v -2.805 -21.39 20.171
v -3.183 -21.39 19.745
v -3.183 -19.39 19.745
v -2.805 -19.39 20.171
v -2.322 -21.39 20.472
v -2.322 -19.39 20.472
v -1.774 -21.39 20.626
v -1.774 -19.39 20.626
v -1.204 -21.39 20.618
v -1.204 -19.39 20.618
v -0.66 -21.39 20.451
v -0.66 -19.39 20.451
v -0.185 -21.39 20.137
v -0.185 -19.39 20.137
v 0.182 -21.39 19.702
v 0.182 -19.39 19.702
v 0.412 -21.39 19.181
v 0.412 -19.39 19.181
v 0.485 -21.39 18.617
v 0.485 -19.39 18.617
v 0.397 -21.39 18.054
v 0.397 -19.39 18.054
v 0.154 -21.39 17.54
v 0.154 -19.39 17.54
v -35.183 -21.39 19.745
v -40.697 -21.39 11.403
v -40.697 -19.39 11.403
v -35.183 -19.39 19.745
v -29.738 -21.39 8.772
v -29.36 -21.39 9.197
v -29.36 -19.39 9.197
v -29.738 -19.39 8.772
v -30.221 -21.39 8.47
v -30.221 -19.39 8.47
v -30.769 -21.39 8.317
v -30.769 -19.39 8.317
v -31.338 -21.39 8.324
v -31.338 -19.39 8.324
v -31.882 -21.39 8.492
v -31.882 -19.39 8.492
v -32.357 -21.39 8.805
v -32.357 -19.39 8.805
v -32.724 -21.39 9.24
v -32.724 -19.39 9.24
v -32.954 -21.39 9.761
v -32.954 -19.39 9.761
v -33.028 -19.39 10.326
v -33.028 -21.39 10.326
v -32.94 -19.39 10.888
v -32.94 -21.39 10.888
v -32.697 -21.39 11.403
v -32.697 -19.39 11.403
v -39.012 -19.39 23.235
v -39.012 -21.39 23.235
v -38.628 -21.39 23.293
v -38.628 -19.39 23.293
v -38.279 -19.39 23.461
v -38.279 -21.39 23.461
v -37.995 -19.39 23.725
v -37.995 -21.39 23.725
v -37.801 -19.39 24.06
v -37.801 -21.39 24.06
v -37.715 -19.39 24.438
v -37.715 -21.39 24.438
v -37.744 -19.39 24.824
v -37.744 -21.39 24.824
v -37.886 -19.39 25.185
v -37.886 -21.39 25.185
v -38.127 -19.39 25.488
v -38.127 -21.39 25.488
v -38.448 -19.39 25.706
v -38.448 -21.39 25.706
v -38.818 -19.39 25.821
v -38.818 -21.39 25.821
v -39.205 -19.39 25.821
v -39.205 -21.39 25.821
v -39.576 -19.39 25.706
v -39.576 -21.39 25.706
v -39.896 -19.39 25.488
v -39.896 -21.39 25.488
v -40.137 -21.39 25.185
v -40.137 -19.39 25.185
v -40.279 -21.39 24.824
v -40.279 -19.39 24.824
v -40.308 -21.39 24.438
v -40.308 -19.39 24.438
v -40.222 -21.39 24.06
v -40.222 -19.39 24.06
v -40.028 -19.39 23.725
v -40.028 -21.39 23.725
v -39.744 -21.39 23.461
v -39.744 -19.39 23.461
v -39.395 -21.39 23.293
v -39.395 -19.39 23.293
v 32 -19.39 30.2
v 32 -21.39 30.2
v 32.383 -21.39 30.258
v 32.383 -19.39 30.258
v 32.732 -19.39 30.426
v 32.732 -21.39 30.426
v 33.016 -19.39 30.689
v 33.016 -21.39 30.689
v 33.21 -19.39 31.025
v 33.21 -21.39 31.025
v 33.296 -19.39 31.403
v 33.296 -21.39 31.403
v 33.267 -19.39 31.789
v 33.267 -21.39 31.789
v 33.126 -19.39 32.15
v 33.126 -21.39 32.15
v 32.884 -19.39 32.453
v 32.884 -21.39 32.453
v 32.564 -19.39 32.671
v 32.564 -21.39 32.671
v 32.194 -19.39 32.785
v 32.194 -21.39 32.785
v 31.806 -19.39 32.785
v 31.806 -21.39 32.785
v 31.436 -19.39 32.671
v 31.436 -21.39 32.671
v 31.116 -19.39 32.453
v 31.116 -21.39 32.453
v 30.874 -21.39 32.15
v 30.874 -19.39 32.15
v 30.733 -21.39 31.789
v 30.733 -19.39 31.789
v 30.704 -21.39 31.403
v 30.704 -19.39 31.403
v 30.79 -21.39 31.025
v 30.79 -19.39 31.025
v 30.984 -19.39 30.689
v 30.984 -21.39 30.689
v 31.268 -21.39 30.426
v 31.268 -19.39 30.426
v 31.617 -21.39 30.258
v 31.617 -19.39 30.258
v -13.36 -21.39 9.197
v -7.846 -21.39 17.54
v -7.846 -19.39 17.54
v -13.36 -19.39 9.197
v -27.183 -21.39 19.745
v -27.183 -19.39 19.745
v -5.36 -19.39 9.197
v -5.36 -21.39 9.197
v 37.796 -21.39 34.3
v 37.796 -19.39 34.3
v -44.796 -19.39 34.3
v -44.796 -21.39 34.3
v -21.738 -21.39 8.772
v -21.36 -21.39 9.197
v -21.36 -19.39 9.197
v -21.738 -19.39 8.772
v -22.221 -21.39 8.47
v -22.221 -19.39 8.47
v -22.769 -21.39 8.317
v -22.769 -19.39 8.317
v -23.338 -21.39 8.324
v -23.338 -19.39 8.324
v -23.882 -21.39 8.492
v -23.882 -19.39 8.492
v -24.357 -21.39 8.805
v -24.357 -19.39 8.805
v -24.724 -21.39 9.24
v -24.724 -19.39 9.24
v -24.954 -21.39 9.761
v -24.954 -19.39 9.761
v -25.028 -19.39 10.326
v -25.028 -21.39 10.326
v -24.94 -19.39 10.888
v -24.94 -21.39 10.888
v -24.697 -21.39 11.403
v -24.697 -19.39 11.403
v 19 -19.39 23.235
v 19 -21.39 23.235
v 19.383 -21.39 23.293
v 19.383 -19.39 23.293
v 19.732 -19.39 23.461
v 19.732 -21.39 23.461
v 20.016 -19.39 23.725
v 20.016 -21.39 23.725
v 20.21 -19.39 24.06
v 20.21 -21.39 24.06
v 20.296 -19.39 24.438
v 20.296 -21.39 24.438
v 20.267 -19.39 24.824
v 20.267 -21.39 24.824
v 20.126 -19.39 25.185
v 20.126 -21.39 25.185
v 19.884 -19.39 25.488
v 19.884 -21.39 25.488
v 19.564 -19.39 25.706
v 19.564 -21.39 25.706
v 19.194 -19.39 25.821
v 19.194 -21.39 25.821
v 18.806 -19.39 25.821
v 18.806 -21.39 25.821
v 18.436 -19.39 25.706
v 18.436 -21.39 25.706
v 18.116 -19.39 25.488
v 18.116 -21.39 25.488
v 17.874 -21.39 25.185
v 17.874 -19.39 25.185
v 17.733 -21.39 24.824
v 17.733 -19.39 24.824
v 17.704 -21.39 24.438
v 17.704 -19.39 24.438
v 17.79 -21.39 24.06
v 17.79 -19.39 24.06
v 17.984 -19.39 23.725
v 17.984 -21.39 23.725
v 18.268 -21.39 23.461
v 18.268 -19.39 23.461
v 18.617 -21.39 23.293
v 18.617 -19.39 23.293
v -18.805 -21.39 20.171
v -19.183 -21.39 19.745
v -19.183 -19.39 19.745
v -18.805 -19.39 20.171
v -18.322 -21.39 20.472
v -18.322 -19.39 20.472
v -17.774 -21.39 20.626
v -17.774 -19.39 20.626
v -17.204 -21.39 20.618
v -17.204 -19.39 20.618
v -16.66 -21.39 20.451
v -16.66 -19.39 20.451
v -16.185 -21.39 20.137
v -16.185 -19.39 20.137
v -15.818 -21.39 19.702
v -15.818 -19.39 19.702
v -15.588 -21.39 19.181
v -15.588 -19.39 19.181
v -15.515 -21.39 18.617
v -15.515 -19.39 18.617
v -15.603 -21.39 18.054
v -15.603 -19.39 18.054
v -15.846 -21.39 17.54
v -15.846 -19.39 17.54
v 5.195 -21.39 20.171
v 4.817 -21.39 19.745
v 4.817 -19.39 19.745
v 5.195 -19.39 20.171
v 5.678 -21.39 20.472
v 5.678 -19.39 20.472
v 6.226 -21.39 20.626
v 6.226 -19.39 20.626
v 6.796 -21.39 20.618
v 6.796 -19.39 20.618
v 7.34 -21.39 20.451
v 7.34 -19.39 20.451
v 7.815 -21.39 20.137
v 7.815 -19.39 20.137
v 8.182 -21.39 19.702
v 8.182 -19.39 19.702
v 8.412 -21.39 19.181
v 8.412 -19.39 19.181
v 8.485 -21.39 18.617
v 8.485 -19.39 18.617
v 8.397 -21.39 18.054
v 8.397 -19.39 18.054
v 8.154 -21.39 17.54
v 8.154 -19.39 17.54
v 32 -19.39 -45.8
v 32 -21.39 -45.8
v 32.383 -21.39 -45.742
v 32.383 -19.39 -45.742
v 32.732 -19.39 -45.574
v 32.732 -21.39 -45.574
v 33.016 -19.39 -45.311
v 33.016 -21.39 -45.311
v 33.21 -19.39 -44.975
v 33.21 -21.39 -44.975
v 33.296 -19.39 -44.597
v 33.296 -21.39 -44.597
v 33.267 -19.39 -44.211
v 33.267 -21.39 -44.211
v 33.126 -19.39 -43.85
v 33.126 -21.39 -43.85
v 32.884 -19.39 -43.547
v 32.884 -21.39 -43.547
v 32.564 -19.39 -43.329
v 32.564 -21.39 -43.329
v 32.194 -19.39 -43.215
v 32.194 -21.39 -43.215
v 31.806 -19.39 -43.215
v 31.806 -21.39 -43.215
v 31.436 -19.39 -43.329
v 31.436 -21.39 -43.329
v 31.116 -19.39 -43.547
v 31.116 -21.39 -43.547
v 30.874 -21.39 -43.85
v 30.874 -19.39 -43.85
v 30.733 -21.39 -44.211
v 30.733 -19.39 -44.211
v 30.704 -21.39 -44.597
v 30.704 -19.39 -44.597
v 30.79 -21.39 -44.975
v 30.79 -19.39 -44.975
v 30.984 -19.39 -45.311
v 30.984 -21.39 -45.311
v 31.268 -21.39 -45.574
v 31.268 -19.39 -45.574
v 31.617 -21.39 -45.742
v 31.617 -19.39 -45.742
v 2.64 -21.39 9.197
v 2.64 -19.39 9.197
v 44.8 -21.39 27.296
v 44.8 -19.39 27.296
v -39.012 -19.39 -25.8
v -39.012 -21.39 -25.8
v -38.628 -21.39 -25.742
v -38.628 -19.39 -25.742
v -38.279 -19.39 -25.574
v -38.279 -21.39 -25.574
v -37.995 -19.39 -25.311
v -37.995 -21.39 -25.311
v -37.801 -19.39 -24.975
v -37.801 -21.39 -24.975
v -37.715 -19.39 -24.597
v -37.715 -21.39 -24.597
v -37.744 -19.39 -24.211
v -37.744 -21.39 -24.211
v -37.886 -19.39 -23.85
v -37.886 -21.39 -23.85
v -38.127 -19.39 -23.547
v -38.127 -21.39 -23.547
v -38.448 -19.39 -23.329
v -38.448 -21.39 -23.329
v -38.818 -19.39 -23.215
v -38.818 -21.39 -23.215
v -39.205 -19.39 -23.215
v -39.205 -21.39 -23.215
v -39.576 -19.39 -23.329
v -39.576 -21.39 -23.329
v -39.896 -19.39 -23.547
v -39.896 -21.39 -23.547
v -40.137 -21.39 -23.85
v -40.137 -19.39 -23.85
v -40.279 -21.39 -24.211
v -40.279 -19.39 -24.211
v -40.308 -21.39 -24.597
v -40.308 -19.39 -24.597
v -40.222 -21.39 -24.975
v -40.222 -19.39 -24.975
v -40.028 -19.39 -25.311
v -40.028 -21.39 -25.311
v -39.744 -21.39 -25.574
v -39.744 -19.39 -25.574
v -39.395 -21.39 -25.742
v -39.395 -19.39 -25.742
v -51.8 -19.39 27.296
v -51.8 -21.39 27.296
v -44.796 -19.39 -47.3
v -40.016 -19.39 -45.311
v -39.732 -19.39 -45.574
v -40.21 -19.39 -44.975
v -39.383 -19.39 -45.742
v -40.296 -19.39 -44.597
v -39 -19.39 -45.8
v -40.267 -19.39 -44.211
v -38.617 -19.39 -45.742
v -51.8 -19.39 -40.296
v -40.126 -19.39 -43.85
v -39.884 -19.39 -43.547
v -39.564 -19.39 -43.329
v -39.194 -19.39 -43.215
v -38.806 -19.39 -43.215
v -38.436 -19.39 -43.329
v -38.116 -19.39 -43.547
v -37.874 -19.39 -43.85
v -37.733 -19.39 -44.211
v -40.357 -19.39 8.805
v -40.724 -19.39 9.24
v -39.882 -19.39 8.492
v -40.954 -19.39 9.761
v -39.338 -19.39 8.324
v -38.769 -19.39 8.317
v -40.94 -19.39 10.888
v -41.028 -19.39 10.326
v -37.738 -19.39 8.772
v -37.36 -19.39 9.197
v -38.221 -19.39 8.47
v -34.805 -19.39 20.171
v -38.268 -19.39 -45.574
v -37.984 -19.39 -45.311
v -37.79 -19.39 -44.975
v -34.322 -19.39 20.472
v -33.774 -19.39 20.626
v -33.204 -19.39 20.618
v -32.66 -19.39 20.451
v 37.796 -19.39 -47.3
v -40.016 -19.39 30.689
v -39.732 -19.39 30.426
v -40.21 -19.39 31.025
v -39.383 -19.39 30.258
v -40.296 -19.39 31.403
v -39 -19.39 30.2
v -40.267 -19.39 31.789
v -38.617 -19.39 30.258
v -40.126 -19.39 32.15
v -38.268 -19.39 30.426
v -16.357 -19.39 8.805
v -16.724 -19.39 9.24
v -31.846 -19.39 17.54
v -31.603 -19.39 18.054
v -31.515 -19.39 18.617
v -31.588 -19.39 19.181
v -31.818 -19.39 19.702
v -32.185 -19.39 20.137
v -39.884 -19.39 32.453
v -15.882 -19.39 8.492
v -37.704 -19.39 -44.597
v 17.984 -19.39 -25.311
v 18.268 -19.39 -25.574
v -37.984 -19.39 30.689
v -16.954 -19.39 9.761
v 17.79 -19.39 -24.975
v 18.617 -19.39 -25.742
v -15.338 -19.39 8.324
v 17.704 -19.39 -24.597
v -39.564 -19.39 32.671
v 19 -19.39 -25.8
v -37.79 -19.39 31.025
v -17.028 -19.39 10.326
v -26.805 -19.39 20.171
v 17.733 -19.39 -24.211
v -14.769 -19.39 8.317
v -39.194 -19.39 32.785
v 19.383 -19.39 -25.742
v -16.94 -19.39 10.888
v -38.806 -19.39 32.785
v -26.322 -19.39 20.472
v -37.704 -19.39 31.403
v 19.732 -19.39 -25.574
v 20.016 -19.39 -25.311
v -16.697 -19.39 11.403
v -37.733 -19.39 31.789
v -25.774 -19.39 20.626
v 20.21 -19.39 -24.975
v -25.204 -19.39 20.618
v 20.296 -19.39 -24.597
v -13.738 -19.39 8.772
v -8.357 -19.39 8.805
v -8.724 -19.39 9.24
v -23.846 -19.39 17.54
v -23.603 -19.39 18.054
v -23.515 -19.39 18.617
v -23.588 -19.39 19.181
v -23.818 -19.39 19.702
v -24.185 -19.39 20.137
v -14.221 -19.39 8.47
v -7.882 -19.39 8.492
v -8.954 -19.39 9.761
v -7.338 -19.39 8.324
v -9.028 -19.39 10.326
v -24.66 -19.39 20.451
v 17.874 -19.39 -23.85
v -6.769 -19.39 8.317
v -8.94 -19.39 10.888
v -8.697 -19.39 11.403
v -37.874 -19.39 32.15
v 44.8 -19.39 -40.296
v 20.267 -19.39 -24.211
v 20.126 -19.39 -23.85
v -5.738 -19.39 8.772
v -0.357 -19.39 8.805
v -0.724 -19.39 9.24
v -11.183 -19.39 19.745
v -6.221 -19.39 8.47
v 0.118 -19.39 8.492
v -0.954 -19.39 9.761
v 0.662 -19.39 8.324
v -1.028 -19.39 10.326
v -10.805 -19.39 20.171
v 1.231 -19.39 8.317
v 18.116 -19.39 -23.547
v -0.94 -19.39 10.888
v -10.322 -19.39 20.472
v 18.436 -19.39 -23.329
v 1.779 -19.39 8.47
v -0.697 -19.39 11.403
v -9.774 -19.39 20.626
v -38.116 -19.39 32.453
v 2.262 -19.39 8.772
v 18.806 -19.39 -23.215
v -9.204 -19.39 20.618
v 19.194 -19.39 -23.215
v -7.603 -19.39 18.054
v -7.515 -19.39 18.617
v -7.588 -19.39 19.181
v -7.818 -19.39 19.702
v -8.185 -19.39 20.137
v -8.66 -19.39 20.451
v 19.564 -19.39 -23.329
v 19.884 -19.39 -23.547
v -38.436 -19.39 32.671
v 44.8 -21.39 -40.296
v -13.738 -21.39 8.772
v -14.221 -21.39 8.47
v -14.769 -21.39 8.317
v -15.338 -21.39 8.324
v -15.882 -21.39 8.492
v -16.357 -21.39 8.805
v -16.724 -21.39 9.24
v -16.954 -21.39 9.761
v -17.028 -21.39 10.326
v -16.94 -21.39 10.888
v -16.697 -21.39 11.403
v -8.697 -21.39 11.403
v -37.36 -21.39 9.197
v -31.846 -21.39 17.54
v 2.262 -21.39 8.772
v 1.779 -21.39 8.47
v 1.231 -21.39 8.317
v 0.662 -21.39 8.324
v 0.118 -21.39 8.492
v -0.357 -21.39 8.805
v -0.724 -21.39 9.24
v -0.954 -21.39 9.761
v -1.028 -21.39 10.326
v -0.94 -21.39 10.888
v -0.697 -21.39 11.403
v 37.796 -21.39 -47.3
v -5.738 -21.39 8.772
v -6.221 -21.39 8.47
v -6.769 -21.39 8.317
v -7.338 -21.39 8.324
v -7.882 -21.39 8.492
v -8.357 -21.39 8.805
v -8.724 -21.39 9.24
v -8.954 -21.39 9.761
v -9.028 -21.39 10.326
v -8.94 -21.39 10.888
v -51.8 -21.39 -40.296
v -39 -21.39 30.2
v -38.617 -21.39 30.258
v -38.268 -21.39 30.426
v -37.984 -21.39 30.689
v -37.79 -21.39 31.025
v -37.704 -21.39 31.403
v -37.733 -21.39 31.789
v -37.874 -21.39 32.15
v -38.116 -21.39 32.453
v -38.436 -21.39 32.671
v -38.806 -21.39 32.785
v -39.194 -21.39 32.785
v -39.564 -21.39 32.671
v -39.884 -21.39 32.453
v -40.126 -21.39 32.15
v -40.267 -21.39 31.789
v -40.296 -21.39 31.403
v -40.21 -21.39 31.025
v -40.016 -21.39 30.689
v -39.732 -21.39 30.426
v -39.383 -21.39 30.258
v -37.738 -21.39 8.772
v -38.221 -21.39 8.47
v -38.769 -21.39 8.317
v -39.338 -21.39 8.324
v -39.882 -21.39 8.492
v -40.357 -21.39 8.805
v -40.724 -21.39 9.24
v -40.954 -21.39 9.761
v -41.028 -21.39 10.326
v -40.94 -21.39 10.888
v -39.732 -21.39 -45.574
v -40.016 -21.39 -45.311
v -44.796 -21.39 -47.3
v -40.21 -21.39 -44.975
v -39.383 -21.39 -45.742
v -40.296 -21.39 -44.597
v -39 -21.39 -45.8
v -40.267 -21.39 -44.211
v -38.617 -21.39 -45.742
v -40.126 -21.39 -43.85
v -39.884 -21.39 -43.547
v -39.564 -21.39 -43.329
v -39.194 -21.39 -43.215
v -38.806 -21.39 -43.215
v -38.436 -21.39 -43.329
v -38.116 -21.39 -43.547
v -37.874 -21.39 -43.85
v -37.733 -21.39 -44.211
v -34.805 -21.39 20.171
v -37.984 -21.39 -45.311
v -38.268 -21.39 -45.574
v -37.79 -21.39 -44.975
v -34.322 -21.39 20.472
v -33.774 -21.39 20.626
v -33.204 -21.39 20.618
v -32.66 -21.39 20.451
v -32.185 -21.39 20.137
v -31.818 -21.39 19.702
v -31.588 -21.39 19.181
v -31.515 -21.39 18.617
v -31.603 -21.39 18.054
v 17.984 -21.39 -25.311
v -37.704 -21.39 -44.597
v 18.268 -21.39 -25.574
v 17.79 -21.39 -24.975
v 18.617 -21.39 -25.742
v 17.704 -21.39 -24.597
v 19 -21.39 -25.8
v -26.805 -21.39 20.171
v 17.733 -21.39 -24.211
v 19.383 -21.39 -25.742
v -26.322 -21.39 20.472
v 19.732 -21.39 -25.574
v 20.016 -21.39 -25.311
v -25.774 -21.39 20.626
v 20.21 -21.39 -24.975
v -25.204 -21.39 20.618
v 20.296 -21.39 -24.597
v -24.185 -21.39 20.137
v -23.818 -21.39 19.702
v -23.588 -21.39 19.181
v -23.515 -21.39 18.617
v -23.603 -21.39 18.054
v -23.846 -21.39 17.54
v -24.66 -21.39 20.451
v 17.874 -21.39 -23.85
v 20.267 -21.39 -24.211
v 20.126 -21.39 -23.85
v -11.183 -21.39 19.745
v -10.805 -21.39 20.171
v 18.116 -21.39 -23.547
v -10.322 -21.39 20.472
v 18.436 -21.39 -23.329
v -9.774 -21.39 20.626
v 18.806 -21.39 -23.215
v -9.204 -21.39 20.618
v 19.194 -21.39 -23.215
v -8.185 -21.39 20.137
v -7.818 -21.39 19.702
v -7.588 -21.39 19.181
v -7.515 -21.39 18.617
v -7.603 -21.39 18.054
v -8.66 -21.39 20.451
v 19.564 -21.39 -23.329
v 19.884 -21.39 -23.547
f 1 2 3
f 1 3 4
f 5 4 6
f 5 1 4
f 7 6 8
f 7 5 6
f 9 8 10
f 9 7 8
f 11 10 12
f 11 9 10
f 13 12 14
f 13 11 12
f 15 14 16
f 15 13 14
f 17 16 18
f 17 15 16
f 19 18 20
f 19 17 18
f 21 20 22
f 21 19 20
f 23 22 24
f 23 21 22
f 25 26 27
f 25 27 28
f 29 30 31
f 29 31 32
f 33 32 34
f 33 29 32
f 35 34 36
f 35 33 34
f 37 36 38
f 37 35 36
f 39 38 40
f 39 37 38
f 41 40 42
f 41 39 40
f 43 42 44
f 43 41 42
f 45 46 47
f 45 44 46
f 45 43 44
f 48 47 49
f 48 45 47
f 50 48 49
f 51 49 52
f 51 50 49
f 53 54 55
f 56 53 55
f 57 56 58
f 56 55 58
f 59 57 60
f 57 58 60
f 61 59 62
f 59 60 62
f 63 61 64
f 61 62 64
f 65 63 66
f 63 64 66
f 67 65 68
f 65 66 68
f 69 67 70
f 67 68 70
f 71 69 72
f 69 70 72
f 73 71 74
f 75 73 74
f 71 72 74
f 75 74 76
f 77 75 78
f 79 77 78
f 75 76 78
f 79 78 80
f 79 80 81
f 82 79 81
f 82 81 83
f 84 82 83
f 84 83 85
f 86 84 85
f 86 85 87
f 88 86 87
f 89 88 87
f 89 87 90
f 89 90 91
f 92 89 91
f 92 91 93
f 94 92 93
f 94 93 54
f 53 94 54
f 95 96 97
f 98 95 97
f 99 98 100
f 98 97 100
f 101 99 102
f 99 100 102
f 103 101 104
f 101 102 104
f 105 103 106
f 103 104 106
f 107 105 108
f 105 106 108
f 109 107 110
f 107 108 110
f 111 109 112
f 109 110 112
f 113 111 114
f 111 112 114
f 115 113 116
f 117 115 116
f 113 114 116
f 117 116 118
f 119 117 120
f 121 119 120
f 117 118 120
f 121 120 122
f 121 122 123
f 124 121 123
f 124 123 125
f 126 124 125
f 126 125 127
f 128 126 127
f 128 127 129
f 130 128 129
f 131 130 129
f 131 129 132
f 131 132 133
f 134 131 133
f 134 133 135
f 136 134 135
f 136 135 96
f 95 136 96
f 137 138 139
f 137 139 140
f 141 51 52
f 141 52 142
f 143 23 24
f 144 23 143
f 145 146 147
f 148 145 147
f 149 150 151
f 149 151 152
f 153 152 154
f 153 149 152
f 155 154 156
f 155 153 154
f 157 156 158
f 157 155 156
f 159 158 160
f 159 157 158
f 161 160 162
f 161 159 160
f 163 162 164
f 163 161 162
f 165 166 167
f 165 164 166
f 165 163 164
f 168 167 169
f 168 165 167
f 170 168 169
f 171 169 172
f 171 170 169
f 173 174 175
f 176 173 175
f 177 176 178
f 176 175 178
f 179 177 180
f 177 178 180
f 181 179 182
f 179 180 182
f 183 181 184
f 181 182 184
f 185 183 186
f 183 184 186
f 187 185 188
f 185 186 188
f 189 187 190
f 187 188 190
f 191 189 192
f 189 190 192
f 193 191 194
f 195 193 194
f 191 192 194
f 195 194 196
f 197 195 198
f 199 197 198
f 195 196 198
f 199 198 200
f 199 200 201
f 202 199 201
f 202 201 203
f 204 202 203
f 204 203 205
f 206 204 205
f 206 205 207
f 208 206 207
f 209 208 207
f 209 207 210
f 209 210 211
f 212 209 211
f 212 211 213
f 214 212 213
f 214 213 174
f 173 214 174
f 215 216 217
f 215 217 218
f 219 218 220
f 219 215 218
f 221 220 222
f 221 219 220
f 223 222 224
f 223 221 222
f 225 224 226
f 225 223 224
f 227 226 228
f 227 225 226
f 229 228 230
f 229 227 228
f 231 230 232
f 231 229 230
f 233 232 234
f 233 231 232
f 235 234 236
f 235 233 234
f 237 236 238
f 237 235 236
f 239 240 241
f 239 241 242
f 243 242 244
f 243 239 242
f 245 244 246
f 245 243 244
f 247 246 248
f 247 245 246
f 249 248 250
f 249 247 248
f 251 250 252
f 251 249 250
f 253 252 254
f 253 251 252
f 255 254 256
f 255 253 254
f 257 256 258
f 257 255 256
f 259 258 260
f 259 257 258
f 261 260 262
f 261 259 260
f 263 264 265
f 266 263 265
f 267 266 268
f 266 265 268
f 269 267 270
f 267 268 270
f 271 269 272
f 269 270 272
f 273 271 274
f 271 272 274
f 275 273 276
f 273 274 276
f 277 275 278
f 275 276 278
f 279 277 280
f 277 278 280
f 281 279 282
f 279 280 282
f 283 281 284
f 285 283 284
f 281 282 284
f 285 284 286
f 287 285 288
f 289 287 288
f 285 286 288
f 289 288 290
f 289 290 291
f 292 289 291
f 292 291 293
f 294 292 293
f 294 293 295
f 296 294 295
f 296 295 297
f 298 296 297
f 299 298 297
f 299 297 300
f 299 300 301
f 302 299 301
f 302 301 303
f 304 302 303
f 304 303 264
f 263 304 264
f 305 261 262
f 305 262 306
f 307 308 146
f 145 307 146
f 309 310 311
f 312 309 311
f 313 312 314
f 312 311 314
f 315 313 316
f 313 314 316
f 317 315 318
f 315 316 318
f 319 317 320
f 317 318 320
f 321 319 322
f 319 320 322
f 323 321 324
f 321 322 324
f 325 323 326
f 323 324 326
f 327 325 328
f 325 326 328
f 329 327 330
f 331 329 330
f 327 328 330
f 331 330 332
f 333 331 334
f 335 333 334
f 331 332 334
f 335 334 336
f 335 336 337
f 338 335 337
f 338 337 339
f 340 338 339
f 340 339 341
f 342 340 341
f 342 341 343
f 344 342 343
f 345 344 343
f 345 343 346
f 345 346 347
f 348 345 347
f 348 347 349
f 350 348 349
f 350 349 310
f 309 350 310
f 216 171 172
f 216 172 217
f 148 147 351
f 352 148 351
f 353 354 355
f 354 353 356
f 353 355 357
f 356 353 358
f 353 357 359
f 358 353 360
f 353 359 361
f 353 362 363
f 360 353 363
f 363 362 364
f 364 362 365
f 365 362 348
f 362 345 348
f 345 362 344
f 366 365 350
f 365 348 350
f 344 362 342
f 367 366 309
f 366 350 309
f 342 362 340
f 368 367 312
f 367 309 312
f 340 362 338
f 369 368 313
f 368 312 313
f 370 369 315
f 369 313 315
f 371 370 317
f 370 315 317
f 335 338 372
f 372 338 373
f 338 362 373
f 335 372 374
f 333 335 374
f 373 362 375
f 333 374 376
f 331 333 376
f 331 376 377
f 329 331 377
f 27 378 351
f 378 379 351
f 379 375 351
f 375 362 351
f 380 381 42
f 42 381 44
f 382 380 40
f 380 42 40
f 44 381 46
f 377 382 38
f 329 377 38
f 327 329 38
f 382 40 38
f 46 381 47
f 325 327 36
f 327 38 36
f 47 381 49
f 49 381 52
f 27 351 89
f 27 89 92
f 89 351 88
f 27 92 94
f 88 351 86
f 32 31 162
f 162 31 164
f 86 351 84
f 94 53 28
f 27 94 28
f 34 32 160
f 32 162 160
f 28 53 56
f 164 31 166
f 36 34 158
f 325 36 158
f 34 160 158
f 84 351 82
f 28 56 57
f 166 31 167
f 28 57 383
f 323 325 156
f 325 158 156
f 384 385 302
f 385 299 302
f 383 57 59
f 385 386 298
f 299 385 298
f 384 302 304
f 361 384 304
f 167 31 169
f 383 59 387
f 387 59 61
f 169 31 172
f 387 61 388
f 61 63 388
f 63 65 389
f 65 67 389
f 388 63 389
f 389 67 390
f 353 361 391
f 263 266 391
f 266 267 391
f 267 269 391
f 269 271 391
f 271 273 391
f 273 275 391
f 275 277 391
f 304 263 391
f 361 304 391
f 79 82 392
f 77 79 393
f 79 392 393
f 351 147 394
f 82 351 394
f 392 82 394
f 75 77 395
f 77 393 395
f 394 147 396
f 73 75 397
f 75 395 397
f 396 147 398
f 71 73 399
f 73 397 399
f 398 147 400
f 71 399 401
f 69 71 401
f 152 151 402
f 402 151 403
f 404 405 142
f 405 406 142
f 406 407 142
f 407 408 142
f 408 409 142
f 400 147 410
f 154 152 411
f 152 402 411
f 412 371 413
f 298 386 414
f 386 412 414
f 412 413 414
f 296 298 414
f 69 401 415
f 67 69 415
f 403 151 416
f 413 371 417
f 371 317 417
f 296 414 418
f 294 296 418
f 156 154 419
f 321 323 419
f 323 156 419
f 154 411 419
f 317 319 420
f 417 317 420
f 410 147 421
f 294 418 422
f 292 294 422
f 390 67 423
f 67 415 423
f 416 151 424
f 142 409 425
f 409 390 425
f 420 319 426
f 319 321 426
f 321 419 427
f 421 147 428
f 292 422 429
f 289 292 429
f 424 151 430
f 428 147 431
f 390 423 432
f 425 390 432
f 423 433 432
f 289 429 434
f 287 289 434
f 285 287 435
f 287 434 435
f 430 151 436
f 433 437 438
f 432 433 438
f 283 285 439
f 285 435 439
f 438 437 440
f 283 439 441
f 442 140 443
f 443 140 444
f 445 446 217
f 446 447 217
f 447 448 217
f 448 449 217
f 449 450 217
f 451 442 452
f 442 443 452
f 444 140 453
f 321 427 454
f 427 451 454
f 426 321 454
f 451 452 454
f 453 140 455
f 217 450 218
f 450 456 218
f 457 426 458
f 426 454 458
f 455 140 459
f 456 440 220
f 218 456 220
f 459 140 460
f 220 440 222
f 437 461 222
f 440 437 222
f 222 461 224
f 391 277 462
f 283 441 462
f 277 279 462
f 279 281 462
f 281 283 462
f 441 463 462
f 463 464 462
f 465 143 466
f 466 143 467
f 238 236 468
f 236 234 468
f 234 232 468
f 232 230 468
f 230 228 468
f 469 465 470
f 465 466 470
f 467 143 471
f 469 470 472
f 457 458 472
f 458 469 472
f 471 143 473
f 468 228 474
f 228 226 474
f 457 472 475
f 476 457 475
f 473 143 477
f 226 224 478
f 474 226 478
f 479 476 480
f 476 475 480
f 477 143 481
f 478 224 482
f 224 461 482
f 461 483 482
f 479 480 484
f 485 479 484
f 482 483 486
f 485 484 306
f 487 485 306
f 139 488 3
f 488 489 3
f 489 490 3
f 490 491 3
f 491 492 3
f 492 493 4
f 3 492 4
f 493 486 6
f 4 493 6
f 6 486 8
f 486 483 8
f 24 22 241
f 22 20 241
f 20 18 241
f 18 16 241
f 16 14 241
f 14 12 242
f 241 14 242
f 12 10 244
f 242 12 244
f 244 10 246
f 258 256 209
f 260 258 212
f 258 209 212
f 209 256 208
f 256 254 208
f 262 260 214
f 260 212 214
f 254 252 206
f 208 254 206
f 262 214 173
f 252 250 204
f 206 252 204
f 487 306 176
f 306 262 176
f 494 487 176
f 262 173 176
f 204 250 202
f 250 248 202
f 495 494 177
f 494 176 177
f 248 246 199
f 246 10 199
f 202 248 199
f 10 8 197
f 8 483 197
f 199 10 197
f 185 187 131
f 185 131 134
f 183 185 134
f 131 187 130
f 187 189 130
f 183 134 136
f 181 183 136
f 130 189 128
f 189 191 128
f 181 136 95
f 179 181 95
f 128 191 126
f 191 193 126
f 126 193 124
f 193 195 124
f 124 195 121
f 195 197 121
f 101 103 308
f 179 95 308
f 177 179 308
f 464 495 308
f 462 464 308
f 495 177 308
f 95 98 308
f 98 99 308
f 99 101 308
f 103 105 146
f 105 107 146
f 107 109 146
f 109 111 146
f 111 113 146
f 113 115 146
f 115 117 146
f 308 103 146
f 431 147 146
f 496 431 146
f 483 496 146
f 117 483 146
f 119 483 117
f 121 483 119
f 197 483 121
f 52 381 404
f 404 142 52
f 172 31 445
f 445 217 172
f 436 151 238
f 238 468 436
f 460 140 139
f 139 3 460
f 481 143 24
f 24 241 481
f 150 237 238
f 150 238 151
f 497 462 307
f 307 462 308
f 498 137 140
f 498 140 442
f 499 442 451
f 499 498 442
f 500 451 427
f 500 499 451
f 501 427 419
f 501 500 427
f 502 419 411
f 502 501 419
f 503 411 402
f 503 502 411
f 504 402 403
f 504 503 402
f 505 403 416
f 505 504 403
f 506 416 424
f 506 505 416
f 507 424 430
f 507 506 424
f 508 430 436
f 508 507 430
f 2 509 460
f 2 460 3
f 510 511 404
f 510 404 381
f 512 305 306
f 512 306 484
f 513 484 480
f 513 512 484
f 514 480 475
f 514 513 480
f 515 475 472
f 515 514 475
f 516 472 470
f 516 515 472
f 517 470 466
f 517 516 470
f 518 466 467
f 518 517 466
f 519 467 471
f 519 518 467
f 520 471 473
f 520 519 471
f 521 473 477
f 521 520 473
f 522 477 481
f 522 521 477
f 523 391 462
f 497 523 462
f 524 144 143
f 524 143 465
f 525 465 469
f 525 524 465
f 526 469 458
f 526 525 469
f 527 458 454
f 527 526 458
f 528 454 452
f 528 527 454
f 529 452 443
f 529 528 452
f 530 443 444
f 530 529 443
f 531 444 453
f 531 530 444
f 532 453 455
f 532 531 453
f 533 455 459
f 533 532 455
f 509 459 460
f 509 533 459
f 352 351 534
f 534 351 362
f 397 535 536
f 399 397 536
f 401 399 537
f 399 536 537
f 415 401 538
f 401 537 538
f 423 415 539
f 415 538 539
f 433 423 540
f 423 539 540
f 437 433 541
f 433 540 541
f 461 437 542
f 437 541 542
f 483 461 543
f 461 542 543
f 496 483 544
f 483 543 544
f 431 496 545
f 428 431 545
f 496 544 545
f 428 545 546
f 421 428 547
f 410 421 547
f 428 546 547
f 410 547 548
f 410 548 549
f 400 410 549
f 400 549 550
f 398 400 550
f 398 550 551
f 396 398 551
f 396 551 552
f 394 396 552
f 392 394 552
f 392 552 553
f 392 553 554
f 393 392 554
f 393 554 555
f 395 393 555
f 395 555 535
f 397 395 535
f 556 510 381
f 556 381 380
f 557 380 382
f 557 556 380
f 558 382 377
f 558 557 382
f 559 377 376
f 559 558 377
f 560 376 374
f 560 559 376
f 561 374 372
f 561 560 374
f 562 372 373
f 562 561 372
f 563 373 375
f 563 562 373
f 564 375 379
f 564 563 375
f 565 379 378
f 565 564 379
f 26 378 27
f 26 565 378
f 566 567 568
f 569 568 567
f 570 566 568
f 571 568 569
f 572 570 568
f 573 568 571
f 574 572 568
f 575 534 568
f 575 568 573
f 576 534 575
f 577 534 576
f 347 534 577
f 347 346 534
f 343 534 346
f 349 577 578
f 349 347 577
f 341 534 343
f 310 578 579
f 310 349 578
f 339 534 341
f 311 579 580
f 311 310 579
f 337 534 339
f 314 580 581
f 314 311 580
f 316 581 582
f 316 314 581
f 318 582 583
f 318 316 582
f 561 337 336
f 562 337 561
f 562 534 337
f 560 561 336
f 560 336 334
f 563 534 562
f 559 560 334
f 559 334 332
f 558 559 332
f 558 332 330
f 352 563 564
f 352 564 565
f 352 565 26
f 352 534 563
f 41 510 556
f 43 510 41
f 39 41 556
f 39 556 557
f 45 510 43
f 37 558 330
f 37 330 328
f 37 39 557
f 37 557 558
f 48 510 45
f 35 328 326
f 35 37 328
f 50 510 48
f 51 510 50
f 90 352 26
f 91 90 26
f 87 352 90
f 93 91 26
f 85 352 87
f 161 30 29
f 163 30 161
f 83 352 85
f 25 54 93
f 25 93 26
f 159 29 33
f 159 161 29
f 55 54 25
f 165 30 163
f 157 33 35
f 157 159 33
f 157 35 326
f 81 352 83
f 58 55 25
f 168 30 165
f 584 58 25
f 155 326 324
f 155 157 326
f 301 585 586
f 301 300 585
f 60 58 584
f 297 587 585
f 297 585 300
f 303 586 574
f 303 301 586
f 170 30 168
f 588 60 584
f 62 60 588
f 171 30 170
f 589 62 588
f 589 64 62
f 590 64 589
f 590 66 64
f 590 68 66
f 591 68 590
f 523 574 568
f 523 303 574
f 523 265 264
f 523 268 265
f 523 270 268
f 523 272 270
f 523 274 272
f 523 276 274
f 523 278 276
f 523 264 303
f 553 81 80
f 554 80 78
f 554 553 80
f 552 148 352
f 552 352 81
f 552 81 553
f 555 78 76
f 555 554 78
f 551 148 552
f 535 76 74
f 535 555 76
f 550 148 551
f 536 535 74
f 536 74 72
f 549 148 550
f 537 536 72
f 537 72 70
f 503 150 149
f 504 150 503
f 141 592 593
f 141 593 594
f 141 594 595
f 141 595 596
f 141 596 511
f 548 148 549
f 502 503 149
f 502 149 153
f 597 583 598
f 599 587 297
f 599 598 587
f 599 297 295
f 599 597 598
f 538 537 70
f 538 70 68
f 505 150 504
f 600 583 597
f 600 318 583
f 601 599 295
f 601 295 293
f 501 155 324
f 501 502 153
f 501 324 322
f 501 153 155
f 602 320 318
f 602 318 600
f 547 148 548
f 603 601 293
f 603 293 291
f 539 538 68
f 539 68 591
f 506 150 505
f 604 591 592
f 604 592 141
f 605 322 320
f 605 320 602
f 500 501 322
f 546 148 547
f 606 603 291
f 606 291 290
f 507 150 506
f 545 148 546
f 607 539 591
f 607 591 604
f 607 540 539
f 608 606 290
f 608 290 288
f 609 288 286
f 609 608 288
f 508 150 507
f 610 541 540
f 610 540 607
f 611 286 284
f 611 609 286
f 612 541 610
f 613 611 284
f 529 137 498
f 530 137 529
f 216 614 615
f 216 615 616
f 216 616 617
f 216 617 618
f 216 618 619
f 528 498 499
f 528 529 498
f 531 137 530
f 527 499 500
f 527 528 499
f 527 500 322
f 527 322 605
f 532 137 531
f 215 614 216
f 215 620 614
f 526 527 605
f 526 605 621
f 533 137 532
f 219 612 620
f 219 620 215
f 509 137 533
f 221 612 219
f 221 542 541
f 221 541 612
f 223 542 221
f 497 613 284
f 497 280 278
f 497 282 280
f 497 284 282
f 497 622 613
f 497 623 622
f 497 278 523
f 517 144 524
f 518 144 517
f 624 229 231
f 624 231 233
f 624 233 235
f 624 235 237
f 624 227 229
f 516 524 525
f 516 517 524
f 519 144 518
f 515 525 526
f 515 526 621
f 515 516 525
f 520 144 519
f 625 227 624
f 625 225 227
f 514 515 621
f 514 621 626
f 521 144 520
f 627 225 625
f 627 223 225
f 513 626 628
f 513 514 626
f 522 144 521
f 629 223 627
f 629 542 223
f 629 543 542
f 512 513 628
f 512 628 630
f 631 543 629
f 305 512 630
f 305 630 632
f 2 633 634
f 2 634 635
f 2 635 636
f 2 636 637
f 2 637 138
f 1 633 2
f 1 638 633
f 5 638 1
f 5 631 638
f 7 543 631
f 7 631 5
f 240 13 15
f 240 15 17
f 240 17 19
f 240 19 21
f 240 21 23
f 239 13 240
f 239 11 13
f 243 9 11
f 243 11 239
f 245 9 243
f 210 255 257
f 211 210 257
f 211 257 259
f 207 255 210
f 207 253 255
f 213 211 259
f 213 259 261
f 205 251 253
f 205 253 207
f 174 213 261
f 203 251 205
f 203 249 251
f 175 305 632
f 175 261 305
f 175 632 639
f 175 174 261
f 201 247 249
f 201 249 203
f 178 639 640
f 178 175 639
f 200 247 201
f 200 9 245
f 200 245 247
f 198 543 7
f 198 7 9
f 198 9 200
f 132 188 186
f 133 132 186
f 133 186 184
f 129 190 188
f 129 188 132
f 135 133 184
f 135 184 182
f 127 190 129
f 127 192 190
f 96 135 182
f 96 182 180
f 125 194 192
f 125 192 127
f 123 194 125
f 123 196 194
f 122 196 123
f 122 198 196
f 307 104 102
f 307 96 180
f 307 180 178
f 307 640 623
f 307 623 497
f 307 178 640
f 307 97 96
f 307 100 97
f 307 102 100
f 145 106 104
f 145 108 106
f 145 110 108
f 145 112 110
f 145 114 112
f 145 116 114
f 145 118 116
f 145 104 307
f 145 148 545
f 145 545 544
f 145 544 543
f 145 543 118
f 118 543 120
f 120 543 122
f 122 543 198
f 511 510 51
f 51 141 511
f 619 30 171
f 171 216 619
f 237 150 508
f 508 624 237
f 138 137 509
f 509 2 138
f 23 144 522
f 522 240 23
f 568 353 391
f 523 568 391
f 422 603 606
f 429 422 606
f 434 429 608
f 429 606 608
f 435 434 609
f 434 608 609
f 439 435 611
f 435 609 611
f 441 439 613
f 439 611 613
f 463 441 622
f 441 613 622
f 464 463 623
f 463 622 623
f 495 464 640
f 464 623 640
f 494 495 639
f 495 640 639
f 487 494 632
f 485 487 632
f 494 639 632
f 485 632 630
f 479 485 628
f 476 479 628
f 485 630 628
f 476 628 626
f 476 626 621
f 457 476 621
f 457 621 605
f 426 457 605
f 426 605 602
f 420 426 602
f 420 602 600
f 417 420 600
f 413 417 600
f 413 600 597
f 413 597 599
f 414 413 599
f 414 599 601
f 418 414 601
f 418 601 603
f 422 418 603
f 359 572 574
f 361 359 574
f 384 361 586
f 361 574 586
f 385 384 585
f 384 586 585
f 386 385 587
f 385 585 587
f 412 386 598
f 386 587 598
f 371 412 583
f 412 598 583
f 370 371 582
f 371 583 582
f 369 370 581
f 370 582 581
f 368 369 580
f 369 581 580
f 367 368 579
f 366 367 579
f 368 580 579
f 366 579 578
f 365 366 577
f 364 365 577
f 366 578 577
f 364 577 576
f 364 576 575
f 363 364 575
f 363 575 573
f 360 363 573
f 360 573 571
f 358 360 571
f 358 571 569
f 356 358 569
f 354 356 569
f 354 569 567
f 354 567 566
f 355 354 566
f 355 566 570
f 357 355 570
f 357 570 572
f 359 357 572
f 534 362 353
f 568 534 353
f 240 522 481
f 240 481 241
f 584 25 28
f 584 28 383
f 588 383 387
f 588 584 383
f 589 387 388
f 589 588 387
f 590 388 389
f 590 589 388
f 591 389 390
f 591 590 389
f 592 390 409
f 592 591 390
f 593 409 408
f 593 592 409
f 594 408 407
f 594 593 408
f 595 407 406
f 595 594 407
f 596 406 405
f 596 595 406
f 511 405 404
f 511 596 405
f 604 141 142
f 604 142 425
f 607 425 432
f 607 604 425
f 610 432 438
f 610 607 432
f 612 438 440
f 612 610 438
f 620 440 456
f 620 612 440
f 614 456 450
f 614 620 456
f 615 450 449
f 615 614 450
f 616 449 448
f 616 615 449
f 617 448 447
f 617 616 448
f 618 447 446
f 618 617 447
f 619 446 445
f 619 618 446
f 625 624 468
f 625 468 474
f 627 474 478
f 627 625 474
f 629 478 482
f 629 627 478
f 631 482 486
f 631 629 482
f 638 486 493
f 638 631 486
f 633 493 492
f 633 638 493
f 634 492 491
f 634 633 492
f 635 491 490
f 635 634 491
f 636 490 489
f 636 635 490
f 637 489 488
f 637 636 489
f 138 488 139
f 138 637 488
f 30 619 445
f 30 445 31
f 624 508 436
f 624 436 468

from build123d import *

# Parameters (mm, degrees)
EXTRUDE_1_DEPTH     = 2
CUT_EXTRUDE_1_REACH = 72.175
SKETCH_2_R          = 1.3
CUT_EXTRUDE_2_REACH = 72.175
SKETCH_3_R          = 1.3
CUT_EXTRUDE_3_REACH = 72.175


with BuildPart() as part:
    # 草图1 → 凸台-拉伸1 (new body)
    with BuildSketch(Plane.XZ.offset(19.39)):
        Polygon((-51.8, -40.295836944), (-44.795836944, -47.3), (37.795836944, -47.3), (44.8, -40.295836944), (44.8, 27.295836944), (37.795836944, 34.3), (-44.795836944, 34.3), (-51.8, 27.295836944), align=None)
    extrude(amount=EXTRUDE_1_DEPTH)

    # 草图2 → 切除-拉伸1 (cut, up to next)
    with BuildSketch(Plane.XZ.offset(21.39), mode=Mode.PRIVATE) as cut_extrude_1_sk1:
        with Locations(Location((-39.011567772, -24.5, 0), (0, 0, 270))):
            Circle(SKETCH_2_R)
    cut_extrude_1_tool1 = extrude(cut_extrude_1_sk1.sketch, amount=-CUT_EXTRUDE_1_REACH, mode=Mode.PRIVATE) & part.part
    # 草图2 → 切除-拉伸1 (cut, up to next)
    with BuildSketch(Plane.XZ.offset(21.39), mode=Mode.PRIVATE) as cut_extrude_1_sk2:
        with Locations(Location((19, -24.5, 0), (0, 0, 270))):
            Circle(SKETCH_2_R)
    cut_extrude_1_tool2 = extrude(cut_extrude_1_sk2.sketch, amount=-CUT_EXTRUDE_1_REACH, mode=Mode.PRIVATE) & part.part
    # 草图2 → 切除-拉伸1 (cut, up to next)
    with BuildSketch(Plane.XZ.offset(21.39), mode=Mode.PRIVATE) as cut_extrude_1_sk3:
        with Locations(Location((-39.011567772, 24.535212594, 0), (0, 0, 270))):
            Circle(SKETCH_2_R)
    cut_extrude_1_tool3 = extrude(cut_extrude_1_sk3.sketch, amount=-CUT_EXTRUDE_1_REACH, mode=Mode.PRIVATE) & part.part
    # 草图2 → 切除-拉伸1 (cut, up to next)
    with BuildSketch(Plane.XZ.offset(21.39), mode=Mode.PRIVATE) as cut_extrude_1_sk4:
        with Locations(Location((19, 24.535212594, 0), (0, 0, 270))):
            Circle(SKETCH_2_R)
    cut_extrude_1_tool4 = extrude(cut_extrude_1_sk4.sketch, amount=-CUT_EXTRUDE_1_REACH, mode=Mode.PRIVATE) & part.part
    add(cut_extrude_1_tool1.solids().sort_by_distance((-39.011568, -21.39, -24.5))[0], mode=Mode.SUBTRACT)
    add(cut_extrude_1_tool2.solids().sort_by_distance((19, -21.39, -24.5))[0], mode=Mode.SUBTRACT)
    add(cut_extrude_1_tool3.solids().sort_by_distance((-39.011568, -21.39, 24.535213))[0], mode=Mode.SUBTRACT)
    add(cut_extrude_1_tool4.solids().sort_by_distance((19, -21.39, 24.535213))[0], mode=Mode.SUBTRACT)

    # 草图3 → 切除-拉伸2 (cut, up to next)
    with BuildSketch(Plane.XZ.offset(21.39), mode=Mode.PRIVATE) as cut_extrude_2_sk1:
        with Locations(Location((32, -44.5, 0), (0, 0, 270))):
            Circle(SKETCH_3_R)
    cut_extrude_2_tool1 = extrude(cut_extrude_2_sk1.sketch, amount=-CUT_EXTRUDE_2_REACH, mode=Mode.PRIVATE) & part.part
    # 草图3 → 切除-拉伸2 (cut, up to next)
    with BuildSketch(Plane.XZ.offset(21.39), mode=Mode.PRIVATE) as cut_extrude_2_sk2:
        with Locations(Location((-39, -44.5, 0), (0, 0, 270))):
            Circle(SKETCH_3_R)
    cut_extrude_2_tool2 = extrude(cut_extrude_2_sk2.sketch, amount=-CUT_EXTRUDE_2_REACH, mode=Mode.PRIVATE) & part.part
    # 草图3 → 切除-拉伸2 (cut, up to next)
    with BuildSketch(Plane.XZ.offset(21.39), mode=Mode.PRIVATE) as cut_extrude_2_sk3:
        with Locations(Location((32, 31.5, 0), (0, 0, 270))):
            Circle(SKETCH_3_R)
    cut_extrude_2_tool3 = extrude(cut_extrude_2_sk3.sketch, amount=-CUT_EXTRUDE_2_REACH, mode=Mode.PRIVATE) & part.part
    # 草图3 → 切除-拉伸2 (cut, up to next)
    with BuildSketch(Plane.XZ.offset(21.39), mode=Mode.PRIVATE) as cut_extrude_2_sk4:
        with Locations(Location((-39, 31.5, 0), (0, 0, 270))):
            Circle(SKETCH_3_R)
    cut_extrude_2_tool4 = extrude(cut_extrude_2_sk4.sketch, amount=-CUT_EXTRUDE_2_REACH, mode=Mode.PRIVATE) & part.part
    add(cut_extrude_2_tool1.solids().sort_by_distance((32, -21.39, -44.5))[0], mode=Mode.SUBTRACT)
    add(cut_extrude_2_tool2.solids().sort_by_distance((-39, -21.39, -44.5))[0], mode=Mode.SUBTRACT)
    add(cut_extrude_2_tool3.solids().sort_by_distance((32, -21.39, 31.5))[0], mode=Mode.SUBTRACT)
    add(cut_extrude_2_tool4.solids().sort_by_distance((-39, -21.39, 31.5))[0], mode=Mode.SUBTRACT)

    # 草图4 → 切除-拉伸3 (cut, up to next)
    with BuildSketch(Plane.XZ.offset(21.39), mode=Mode.PRIVATE) as cut_extrude_3_sk1:
        with BuildLine():
            Line((-40.69671065, 11.402772719), (-35.182847057, 19.74527284))
            ThreePointArc((-35.182847057, 19.74527284), (-32.411574314, 20.311000146), (-31.845847008, 17.539727403))
            Line((-31.845847008, 17.539727403), (-37.359710601, 9.197227281))
            ThreePointArc((-37.359710601, 9.197227281), (-40.130983344, 8.631499976), (-40.69671065, 11.402772719))
        make_face()
    cut_extrude_3_tool1 = extrude(cut_extrude_3_sk1.sketch, amount=-CUT_EXTRUDE_3_REACH, mode=Mode.PRIVATE) & part.part
    # 草图4 → 切除-拉伸3 (cut, up to next)
    with BuildSketch(Plane.XZ.offset(21.39), mode=Mode.PRIVATE) as cut_extrude_3_sk2:
        with BuildLine():
            Line((-32.69671065, 11.402772719), (-27.182847057, 19.74527284))
            ThreePointArc((-27.182847057, 19.74527284), (-24.411574314, 20.311000146), (-23.845847008, 17.539727403))
            Line((-23.845847008, 17.539727403), (-29.359710601, 9.197227281))
            ThreePointArc((-29.359710601, 9.197227281), (-32.130983344, 8.631499976), (-32.69671065, 11.402772719))
        make_face()
    cut_extrude_3_tool2 = extrude(cut_extrude_3_sk2.sketch, amount=-CUT_EXTRUDE_3_REACH, mode=Mode.PRIVATE) & part.part
    # 草图4 → 切除-拉伸3 (cut, up to next)
    with BuildSketch(Plane.XZ.offset(21.39), mode=Mode.PRIVATE) as cut_extrude_3_sk3:
        with BuildLine():
            Line((-24.69671065, 11.402772719), (-19.182847057, 19.74527284))
            ThreePointArc((-19.182847057, 19.74527284), (-16.411574314, 20.311000146), (-15.845847008, 17.539727403))
            Line((-15.845847008, 17.539727403), (-21.359710601, 9.197227281))
            ThreePointArc((-21.359710601, 9.197227281), (-24.130983344, 8.631499976), (-24.69671065, 11.402772719))
        make_face()
    cut_extrude_3_tool3 = extrude(cut_extrude_3_sk3.sketch, amount=-CUT_EXTRUDE_3_REACH, mode=Mode.PRIVATE) & part.part
    # 草图4 → 切除-拉伸3 (cut, up to next)
    with BuildSketch(Plane.XZ.offset(21.39), mode=Mode.PRIVATE) as cut_extrude_3_sk4:
        with BuildLine():
            Line((-16.69671065, 11.402772719), (-11.182847057, 19.74527284))
            ThreePointArc((-11.182847057, 19.74527284), (-8.411574314, 20.311000146), (-7.845847008, 17.539727403))
            Line((-7.845847008, 17.539727403), (-13.359710601, 9.197227281))
            ThreePointArc((-13.359710601, 9.197227281), (-16.130983344, 8.631499976), (-16.69671065, 11.402772719))
        make_face()
    cut_extrude_3_tool4 = extrude(cut_extrude_3_sk4.sketch, amount=-CUT_EXTRUDE_3_REACH, mode=Mode.PRIVATE) & part.part
    # 草图4 → 切除-拉伸3 (cut, up to next)
    with BuildSketch(Plane.XZ.offset(21.39), mode=Mode.PRIVATE) as cut_extrude_3_sk5:
        with BuildLine():
            Line((-8.69671065, 11.402772719), (-3.182847057, 19.74527284))
            ThreePointArc((-3.182847057, 19.74527284), (-0.411574314, 20.311000146), (0.154152992, 17.539727403))
            Line((0.154152992, 17.539727403), (-5.359710601, 9.197227281))
            ThreePointArc((-5.359710601, 9.197227281), (-8.130983344, 8.631499976), (-8.69671065, 11.402772719))
        make_face()
    cut_extrude_3_tool5 = extrude(cut_extrude_3_sk5.sketch, amount=-CUT_EXTRUDE_3_REACH, mode=Mode.PRIVATE) & part.part
    # 草图4 → 切除-拉伸3 (cut, up to next)
    with BuildSketch(Plane.XZ.offset(21.39), mode=Mode.PRIVATE) as cut_extrude_3_sk6:
        with BuildLine():
            Line((-0.69671065, 11.402772719), (4.817152943, 19.74527284))
            ThreePointArc((4.817152943, 19.74527284), (7.588425686, 20.311000146), (8.154152992, 17.539727403))
            Line((8.154152992, 17.539727403), (2.640289399, 9.197227281))
            ThreePointArc((2.640289399, 9.197227281), (-0.130983344, 8.631499976), (-0.69671065, 11.402772719))
        make_face()
    cut_extrude_3_tool6 = extrude(cut_extrude_3_sk6.sketch, amount=-CUT_EXTRUDE_3_REACH, mode=Mode.PRIVATE) & part.part
    add(cut_extrude_3_tool1.solids().sort_by_distance((-36.271279, -21.39, 14.47125))[0], mode=Mode.SUBTRACT)
    add(cut_extrude_3_tool2.solids().sort_by_distance((-28.271279, -21.39, 14.47125))[0], mode=Mode.SUBTRACT)
    add(cut_extrude_3_tool3.solids().sort_by_distance((-20.271279, -21.39, 14.47125))[0], mode=Mode.SUBTRACT)
    add(cut_extrude_3_tool4.solids().sort_by_distance((-12.271279, -21.39, 14.47125))[0], mode=Mode.SUBTRACT)
    add(cut_extrude_3_tool5.solids().sort_by_distance((-4.271279, -21.39, 14.47125))[0], mode=Mode.SUBTRACT)
    add(cut_extrude_3_tool6.solids().sort_by_distance((3.728721, -21.39, 14.47125))[0], mode=Mode.SUBTRACT)


solid = part.part
